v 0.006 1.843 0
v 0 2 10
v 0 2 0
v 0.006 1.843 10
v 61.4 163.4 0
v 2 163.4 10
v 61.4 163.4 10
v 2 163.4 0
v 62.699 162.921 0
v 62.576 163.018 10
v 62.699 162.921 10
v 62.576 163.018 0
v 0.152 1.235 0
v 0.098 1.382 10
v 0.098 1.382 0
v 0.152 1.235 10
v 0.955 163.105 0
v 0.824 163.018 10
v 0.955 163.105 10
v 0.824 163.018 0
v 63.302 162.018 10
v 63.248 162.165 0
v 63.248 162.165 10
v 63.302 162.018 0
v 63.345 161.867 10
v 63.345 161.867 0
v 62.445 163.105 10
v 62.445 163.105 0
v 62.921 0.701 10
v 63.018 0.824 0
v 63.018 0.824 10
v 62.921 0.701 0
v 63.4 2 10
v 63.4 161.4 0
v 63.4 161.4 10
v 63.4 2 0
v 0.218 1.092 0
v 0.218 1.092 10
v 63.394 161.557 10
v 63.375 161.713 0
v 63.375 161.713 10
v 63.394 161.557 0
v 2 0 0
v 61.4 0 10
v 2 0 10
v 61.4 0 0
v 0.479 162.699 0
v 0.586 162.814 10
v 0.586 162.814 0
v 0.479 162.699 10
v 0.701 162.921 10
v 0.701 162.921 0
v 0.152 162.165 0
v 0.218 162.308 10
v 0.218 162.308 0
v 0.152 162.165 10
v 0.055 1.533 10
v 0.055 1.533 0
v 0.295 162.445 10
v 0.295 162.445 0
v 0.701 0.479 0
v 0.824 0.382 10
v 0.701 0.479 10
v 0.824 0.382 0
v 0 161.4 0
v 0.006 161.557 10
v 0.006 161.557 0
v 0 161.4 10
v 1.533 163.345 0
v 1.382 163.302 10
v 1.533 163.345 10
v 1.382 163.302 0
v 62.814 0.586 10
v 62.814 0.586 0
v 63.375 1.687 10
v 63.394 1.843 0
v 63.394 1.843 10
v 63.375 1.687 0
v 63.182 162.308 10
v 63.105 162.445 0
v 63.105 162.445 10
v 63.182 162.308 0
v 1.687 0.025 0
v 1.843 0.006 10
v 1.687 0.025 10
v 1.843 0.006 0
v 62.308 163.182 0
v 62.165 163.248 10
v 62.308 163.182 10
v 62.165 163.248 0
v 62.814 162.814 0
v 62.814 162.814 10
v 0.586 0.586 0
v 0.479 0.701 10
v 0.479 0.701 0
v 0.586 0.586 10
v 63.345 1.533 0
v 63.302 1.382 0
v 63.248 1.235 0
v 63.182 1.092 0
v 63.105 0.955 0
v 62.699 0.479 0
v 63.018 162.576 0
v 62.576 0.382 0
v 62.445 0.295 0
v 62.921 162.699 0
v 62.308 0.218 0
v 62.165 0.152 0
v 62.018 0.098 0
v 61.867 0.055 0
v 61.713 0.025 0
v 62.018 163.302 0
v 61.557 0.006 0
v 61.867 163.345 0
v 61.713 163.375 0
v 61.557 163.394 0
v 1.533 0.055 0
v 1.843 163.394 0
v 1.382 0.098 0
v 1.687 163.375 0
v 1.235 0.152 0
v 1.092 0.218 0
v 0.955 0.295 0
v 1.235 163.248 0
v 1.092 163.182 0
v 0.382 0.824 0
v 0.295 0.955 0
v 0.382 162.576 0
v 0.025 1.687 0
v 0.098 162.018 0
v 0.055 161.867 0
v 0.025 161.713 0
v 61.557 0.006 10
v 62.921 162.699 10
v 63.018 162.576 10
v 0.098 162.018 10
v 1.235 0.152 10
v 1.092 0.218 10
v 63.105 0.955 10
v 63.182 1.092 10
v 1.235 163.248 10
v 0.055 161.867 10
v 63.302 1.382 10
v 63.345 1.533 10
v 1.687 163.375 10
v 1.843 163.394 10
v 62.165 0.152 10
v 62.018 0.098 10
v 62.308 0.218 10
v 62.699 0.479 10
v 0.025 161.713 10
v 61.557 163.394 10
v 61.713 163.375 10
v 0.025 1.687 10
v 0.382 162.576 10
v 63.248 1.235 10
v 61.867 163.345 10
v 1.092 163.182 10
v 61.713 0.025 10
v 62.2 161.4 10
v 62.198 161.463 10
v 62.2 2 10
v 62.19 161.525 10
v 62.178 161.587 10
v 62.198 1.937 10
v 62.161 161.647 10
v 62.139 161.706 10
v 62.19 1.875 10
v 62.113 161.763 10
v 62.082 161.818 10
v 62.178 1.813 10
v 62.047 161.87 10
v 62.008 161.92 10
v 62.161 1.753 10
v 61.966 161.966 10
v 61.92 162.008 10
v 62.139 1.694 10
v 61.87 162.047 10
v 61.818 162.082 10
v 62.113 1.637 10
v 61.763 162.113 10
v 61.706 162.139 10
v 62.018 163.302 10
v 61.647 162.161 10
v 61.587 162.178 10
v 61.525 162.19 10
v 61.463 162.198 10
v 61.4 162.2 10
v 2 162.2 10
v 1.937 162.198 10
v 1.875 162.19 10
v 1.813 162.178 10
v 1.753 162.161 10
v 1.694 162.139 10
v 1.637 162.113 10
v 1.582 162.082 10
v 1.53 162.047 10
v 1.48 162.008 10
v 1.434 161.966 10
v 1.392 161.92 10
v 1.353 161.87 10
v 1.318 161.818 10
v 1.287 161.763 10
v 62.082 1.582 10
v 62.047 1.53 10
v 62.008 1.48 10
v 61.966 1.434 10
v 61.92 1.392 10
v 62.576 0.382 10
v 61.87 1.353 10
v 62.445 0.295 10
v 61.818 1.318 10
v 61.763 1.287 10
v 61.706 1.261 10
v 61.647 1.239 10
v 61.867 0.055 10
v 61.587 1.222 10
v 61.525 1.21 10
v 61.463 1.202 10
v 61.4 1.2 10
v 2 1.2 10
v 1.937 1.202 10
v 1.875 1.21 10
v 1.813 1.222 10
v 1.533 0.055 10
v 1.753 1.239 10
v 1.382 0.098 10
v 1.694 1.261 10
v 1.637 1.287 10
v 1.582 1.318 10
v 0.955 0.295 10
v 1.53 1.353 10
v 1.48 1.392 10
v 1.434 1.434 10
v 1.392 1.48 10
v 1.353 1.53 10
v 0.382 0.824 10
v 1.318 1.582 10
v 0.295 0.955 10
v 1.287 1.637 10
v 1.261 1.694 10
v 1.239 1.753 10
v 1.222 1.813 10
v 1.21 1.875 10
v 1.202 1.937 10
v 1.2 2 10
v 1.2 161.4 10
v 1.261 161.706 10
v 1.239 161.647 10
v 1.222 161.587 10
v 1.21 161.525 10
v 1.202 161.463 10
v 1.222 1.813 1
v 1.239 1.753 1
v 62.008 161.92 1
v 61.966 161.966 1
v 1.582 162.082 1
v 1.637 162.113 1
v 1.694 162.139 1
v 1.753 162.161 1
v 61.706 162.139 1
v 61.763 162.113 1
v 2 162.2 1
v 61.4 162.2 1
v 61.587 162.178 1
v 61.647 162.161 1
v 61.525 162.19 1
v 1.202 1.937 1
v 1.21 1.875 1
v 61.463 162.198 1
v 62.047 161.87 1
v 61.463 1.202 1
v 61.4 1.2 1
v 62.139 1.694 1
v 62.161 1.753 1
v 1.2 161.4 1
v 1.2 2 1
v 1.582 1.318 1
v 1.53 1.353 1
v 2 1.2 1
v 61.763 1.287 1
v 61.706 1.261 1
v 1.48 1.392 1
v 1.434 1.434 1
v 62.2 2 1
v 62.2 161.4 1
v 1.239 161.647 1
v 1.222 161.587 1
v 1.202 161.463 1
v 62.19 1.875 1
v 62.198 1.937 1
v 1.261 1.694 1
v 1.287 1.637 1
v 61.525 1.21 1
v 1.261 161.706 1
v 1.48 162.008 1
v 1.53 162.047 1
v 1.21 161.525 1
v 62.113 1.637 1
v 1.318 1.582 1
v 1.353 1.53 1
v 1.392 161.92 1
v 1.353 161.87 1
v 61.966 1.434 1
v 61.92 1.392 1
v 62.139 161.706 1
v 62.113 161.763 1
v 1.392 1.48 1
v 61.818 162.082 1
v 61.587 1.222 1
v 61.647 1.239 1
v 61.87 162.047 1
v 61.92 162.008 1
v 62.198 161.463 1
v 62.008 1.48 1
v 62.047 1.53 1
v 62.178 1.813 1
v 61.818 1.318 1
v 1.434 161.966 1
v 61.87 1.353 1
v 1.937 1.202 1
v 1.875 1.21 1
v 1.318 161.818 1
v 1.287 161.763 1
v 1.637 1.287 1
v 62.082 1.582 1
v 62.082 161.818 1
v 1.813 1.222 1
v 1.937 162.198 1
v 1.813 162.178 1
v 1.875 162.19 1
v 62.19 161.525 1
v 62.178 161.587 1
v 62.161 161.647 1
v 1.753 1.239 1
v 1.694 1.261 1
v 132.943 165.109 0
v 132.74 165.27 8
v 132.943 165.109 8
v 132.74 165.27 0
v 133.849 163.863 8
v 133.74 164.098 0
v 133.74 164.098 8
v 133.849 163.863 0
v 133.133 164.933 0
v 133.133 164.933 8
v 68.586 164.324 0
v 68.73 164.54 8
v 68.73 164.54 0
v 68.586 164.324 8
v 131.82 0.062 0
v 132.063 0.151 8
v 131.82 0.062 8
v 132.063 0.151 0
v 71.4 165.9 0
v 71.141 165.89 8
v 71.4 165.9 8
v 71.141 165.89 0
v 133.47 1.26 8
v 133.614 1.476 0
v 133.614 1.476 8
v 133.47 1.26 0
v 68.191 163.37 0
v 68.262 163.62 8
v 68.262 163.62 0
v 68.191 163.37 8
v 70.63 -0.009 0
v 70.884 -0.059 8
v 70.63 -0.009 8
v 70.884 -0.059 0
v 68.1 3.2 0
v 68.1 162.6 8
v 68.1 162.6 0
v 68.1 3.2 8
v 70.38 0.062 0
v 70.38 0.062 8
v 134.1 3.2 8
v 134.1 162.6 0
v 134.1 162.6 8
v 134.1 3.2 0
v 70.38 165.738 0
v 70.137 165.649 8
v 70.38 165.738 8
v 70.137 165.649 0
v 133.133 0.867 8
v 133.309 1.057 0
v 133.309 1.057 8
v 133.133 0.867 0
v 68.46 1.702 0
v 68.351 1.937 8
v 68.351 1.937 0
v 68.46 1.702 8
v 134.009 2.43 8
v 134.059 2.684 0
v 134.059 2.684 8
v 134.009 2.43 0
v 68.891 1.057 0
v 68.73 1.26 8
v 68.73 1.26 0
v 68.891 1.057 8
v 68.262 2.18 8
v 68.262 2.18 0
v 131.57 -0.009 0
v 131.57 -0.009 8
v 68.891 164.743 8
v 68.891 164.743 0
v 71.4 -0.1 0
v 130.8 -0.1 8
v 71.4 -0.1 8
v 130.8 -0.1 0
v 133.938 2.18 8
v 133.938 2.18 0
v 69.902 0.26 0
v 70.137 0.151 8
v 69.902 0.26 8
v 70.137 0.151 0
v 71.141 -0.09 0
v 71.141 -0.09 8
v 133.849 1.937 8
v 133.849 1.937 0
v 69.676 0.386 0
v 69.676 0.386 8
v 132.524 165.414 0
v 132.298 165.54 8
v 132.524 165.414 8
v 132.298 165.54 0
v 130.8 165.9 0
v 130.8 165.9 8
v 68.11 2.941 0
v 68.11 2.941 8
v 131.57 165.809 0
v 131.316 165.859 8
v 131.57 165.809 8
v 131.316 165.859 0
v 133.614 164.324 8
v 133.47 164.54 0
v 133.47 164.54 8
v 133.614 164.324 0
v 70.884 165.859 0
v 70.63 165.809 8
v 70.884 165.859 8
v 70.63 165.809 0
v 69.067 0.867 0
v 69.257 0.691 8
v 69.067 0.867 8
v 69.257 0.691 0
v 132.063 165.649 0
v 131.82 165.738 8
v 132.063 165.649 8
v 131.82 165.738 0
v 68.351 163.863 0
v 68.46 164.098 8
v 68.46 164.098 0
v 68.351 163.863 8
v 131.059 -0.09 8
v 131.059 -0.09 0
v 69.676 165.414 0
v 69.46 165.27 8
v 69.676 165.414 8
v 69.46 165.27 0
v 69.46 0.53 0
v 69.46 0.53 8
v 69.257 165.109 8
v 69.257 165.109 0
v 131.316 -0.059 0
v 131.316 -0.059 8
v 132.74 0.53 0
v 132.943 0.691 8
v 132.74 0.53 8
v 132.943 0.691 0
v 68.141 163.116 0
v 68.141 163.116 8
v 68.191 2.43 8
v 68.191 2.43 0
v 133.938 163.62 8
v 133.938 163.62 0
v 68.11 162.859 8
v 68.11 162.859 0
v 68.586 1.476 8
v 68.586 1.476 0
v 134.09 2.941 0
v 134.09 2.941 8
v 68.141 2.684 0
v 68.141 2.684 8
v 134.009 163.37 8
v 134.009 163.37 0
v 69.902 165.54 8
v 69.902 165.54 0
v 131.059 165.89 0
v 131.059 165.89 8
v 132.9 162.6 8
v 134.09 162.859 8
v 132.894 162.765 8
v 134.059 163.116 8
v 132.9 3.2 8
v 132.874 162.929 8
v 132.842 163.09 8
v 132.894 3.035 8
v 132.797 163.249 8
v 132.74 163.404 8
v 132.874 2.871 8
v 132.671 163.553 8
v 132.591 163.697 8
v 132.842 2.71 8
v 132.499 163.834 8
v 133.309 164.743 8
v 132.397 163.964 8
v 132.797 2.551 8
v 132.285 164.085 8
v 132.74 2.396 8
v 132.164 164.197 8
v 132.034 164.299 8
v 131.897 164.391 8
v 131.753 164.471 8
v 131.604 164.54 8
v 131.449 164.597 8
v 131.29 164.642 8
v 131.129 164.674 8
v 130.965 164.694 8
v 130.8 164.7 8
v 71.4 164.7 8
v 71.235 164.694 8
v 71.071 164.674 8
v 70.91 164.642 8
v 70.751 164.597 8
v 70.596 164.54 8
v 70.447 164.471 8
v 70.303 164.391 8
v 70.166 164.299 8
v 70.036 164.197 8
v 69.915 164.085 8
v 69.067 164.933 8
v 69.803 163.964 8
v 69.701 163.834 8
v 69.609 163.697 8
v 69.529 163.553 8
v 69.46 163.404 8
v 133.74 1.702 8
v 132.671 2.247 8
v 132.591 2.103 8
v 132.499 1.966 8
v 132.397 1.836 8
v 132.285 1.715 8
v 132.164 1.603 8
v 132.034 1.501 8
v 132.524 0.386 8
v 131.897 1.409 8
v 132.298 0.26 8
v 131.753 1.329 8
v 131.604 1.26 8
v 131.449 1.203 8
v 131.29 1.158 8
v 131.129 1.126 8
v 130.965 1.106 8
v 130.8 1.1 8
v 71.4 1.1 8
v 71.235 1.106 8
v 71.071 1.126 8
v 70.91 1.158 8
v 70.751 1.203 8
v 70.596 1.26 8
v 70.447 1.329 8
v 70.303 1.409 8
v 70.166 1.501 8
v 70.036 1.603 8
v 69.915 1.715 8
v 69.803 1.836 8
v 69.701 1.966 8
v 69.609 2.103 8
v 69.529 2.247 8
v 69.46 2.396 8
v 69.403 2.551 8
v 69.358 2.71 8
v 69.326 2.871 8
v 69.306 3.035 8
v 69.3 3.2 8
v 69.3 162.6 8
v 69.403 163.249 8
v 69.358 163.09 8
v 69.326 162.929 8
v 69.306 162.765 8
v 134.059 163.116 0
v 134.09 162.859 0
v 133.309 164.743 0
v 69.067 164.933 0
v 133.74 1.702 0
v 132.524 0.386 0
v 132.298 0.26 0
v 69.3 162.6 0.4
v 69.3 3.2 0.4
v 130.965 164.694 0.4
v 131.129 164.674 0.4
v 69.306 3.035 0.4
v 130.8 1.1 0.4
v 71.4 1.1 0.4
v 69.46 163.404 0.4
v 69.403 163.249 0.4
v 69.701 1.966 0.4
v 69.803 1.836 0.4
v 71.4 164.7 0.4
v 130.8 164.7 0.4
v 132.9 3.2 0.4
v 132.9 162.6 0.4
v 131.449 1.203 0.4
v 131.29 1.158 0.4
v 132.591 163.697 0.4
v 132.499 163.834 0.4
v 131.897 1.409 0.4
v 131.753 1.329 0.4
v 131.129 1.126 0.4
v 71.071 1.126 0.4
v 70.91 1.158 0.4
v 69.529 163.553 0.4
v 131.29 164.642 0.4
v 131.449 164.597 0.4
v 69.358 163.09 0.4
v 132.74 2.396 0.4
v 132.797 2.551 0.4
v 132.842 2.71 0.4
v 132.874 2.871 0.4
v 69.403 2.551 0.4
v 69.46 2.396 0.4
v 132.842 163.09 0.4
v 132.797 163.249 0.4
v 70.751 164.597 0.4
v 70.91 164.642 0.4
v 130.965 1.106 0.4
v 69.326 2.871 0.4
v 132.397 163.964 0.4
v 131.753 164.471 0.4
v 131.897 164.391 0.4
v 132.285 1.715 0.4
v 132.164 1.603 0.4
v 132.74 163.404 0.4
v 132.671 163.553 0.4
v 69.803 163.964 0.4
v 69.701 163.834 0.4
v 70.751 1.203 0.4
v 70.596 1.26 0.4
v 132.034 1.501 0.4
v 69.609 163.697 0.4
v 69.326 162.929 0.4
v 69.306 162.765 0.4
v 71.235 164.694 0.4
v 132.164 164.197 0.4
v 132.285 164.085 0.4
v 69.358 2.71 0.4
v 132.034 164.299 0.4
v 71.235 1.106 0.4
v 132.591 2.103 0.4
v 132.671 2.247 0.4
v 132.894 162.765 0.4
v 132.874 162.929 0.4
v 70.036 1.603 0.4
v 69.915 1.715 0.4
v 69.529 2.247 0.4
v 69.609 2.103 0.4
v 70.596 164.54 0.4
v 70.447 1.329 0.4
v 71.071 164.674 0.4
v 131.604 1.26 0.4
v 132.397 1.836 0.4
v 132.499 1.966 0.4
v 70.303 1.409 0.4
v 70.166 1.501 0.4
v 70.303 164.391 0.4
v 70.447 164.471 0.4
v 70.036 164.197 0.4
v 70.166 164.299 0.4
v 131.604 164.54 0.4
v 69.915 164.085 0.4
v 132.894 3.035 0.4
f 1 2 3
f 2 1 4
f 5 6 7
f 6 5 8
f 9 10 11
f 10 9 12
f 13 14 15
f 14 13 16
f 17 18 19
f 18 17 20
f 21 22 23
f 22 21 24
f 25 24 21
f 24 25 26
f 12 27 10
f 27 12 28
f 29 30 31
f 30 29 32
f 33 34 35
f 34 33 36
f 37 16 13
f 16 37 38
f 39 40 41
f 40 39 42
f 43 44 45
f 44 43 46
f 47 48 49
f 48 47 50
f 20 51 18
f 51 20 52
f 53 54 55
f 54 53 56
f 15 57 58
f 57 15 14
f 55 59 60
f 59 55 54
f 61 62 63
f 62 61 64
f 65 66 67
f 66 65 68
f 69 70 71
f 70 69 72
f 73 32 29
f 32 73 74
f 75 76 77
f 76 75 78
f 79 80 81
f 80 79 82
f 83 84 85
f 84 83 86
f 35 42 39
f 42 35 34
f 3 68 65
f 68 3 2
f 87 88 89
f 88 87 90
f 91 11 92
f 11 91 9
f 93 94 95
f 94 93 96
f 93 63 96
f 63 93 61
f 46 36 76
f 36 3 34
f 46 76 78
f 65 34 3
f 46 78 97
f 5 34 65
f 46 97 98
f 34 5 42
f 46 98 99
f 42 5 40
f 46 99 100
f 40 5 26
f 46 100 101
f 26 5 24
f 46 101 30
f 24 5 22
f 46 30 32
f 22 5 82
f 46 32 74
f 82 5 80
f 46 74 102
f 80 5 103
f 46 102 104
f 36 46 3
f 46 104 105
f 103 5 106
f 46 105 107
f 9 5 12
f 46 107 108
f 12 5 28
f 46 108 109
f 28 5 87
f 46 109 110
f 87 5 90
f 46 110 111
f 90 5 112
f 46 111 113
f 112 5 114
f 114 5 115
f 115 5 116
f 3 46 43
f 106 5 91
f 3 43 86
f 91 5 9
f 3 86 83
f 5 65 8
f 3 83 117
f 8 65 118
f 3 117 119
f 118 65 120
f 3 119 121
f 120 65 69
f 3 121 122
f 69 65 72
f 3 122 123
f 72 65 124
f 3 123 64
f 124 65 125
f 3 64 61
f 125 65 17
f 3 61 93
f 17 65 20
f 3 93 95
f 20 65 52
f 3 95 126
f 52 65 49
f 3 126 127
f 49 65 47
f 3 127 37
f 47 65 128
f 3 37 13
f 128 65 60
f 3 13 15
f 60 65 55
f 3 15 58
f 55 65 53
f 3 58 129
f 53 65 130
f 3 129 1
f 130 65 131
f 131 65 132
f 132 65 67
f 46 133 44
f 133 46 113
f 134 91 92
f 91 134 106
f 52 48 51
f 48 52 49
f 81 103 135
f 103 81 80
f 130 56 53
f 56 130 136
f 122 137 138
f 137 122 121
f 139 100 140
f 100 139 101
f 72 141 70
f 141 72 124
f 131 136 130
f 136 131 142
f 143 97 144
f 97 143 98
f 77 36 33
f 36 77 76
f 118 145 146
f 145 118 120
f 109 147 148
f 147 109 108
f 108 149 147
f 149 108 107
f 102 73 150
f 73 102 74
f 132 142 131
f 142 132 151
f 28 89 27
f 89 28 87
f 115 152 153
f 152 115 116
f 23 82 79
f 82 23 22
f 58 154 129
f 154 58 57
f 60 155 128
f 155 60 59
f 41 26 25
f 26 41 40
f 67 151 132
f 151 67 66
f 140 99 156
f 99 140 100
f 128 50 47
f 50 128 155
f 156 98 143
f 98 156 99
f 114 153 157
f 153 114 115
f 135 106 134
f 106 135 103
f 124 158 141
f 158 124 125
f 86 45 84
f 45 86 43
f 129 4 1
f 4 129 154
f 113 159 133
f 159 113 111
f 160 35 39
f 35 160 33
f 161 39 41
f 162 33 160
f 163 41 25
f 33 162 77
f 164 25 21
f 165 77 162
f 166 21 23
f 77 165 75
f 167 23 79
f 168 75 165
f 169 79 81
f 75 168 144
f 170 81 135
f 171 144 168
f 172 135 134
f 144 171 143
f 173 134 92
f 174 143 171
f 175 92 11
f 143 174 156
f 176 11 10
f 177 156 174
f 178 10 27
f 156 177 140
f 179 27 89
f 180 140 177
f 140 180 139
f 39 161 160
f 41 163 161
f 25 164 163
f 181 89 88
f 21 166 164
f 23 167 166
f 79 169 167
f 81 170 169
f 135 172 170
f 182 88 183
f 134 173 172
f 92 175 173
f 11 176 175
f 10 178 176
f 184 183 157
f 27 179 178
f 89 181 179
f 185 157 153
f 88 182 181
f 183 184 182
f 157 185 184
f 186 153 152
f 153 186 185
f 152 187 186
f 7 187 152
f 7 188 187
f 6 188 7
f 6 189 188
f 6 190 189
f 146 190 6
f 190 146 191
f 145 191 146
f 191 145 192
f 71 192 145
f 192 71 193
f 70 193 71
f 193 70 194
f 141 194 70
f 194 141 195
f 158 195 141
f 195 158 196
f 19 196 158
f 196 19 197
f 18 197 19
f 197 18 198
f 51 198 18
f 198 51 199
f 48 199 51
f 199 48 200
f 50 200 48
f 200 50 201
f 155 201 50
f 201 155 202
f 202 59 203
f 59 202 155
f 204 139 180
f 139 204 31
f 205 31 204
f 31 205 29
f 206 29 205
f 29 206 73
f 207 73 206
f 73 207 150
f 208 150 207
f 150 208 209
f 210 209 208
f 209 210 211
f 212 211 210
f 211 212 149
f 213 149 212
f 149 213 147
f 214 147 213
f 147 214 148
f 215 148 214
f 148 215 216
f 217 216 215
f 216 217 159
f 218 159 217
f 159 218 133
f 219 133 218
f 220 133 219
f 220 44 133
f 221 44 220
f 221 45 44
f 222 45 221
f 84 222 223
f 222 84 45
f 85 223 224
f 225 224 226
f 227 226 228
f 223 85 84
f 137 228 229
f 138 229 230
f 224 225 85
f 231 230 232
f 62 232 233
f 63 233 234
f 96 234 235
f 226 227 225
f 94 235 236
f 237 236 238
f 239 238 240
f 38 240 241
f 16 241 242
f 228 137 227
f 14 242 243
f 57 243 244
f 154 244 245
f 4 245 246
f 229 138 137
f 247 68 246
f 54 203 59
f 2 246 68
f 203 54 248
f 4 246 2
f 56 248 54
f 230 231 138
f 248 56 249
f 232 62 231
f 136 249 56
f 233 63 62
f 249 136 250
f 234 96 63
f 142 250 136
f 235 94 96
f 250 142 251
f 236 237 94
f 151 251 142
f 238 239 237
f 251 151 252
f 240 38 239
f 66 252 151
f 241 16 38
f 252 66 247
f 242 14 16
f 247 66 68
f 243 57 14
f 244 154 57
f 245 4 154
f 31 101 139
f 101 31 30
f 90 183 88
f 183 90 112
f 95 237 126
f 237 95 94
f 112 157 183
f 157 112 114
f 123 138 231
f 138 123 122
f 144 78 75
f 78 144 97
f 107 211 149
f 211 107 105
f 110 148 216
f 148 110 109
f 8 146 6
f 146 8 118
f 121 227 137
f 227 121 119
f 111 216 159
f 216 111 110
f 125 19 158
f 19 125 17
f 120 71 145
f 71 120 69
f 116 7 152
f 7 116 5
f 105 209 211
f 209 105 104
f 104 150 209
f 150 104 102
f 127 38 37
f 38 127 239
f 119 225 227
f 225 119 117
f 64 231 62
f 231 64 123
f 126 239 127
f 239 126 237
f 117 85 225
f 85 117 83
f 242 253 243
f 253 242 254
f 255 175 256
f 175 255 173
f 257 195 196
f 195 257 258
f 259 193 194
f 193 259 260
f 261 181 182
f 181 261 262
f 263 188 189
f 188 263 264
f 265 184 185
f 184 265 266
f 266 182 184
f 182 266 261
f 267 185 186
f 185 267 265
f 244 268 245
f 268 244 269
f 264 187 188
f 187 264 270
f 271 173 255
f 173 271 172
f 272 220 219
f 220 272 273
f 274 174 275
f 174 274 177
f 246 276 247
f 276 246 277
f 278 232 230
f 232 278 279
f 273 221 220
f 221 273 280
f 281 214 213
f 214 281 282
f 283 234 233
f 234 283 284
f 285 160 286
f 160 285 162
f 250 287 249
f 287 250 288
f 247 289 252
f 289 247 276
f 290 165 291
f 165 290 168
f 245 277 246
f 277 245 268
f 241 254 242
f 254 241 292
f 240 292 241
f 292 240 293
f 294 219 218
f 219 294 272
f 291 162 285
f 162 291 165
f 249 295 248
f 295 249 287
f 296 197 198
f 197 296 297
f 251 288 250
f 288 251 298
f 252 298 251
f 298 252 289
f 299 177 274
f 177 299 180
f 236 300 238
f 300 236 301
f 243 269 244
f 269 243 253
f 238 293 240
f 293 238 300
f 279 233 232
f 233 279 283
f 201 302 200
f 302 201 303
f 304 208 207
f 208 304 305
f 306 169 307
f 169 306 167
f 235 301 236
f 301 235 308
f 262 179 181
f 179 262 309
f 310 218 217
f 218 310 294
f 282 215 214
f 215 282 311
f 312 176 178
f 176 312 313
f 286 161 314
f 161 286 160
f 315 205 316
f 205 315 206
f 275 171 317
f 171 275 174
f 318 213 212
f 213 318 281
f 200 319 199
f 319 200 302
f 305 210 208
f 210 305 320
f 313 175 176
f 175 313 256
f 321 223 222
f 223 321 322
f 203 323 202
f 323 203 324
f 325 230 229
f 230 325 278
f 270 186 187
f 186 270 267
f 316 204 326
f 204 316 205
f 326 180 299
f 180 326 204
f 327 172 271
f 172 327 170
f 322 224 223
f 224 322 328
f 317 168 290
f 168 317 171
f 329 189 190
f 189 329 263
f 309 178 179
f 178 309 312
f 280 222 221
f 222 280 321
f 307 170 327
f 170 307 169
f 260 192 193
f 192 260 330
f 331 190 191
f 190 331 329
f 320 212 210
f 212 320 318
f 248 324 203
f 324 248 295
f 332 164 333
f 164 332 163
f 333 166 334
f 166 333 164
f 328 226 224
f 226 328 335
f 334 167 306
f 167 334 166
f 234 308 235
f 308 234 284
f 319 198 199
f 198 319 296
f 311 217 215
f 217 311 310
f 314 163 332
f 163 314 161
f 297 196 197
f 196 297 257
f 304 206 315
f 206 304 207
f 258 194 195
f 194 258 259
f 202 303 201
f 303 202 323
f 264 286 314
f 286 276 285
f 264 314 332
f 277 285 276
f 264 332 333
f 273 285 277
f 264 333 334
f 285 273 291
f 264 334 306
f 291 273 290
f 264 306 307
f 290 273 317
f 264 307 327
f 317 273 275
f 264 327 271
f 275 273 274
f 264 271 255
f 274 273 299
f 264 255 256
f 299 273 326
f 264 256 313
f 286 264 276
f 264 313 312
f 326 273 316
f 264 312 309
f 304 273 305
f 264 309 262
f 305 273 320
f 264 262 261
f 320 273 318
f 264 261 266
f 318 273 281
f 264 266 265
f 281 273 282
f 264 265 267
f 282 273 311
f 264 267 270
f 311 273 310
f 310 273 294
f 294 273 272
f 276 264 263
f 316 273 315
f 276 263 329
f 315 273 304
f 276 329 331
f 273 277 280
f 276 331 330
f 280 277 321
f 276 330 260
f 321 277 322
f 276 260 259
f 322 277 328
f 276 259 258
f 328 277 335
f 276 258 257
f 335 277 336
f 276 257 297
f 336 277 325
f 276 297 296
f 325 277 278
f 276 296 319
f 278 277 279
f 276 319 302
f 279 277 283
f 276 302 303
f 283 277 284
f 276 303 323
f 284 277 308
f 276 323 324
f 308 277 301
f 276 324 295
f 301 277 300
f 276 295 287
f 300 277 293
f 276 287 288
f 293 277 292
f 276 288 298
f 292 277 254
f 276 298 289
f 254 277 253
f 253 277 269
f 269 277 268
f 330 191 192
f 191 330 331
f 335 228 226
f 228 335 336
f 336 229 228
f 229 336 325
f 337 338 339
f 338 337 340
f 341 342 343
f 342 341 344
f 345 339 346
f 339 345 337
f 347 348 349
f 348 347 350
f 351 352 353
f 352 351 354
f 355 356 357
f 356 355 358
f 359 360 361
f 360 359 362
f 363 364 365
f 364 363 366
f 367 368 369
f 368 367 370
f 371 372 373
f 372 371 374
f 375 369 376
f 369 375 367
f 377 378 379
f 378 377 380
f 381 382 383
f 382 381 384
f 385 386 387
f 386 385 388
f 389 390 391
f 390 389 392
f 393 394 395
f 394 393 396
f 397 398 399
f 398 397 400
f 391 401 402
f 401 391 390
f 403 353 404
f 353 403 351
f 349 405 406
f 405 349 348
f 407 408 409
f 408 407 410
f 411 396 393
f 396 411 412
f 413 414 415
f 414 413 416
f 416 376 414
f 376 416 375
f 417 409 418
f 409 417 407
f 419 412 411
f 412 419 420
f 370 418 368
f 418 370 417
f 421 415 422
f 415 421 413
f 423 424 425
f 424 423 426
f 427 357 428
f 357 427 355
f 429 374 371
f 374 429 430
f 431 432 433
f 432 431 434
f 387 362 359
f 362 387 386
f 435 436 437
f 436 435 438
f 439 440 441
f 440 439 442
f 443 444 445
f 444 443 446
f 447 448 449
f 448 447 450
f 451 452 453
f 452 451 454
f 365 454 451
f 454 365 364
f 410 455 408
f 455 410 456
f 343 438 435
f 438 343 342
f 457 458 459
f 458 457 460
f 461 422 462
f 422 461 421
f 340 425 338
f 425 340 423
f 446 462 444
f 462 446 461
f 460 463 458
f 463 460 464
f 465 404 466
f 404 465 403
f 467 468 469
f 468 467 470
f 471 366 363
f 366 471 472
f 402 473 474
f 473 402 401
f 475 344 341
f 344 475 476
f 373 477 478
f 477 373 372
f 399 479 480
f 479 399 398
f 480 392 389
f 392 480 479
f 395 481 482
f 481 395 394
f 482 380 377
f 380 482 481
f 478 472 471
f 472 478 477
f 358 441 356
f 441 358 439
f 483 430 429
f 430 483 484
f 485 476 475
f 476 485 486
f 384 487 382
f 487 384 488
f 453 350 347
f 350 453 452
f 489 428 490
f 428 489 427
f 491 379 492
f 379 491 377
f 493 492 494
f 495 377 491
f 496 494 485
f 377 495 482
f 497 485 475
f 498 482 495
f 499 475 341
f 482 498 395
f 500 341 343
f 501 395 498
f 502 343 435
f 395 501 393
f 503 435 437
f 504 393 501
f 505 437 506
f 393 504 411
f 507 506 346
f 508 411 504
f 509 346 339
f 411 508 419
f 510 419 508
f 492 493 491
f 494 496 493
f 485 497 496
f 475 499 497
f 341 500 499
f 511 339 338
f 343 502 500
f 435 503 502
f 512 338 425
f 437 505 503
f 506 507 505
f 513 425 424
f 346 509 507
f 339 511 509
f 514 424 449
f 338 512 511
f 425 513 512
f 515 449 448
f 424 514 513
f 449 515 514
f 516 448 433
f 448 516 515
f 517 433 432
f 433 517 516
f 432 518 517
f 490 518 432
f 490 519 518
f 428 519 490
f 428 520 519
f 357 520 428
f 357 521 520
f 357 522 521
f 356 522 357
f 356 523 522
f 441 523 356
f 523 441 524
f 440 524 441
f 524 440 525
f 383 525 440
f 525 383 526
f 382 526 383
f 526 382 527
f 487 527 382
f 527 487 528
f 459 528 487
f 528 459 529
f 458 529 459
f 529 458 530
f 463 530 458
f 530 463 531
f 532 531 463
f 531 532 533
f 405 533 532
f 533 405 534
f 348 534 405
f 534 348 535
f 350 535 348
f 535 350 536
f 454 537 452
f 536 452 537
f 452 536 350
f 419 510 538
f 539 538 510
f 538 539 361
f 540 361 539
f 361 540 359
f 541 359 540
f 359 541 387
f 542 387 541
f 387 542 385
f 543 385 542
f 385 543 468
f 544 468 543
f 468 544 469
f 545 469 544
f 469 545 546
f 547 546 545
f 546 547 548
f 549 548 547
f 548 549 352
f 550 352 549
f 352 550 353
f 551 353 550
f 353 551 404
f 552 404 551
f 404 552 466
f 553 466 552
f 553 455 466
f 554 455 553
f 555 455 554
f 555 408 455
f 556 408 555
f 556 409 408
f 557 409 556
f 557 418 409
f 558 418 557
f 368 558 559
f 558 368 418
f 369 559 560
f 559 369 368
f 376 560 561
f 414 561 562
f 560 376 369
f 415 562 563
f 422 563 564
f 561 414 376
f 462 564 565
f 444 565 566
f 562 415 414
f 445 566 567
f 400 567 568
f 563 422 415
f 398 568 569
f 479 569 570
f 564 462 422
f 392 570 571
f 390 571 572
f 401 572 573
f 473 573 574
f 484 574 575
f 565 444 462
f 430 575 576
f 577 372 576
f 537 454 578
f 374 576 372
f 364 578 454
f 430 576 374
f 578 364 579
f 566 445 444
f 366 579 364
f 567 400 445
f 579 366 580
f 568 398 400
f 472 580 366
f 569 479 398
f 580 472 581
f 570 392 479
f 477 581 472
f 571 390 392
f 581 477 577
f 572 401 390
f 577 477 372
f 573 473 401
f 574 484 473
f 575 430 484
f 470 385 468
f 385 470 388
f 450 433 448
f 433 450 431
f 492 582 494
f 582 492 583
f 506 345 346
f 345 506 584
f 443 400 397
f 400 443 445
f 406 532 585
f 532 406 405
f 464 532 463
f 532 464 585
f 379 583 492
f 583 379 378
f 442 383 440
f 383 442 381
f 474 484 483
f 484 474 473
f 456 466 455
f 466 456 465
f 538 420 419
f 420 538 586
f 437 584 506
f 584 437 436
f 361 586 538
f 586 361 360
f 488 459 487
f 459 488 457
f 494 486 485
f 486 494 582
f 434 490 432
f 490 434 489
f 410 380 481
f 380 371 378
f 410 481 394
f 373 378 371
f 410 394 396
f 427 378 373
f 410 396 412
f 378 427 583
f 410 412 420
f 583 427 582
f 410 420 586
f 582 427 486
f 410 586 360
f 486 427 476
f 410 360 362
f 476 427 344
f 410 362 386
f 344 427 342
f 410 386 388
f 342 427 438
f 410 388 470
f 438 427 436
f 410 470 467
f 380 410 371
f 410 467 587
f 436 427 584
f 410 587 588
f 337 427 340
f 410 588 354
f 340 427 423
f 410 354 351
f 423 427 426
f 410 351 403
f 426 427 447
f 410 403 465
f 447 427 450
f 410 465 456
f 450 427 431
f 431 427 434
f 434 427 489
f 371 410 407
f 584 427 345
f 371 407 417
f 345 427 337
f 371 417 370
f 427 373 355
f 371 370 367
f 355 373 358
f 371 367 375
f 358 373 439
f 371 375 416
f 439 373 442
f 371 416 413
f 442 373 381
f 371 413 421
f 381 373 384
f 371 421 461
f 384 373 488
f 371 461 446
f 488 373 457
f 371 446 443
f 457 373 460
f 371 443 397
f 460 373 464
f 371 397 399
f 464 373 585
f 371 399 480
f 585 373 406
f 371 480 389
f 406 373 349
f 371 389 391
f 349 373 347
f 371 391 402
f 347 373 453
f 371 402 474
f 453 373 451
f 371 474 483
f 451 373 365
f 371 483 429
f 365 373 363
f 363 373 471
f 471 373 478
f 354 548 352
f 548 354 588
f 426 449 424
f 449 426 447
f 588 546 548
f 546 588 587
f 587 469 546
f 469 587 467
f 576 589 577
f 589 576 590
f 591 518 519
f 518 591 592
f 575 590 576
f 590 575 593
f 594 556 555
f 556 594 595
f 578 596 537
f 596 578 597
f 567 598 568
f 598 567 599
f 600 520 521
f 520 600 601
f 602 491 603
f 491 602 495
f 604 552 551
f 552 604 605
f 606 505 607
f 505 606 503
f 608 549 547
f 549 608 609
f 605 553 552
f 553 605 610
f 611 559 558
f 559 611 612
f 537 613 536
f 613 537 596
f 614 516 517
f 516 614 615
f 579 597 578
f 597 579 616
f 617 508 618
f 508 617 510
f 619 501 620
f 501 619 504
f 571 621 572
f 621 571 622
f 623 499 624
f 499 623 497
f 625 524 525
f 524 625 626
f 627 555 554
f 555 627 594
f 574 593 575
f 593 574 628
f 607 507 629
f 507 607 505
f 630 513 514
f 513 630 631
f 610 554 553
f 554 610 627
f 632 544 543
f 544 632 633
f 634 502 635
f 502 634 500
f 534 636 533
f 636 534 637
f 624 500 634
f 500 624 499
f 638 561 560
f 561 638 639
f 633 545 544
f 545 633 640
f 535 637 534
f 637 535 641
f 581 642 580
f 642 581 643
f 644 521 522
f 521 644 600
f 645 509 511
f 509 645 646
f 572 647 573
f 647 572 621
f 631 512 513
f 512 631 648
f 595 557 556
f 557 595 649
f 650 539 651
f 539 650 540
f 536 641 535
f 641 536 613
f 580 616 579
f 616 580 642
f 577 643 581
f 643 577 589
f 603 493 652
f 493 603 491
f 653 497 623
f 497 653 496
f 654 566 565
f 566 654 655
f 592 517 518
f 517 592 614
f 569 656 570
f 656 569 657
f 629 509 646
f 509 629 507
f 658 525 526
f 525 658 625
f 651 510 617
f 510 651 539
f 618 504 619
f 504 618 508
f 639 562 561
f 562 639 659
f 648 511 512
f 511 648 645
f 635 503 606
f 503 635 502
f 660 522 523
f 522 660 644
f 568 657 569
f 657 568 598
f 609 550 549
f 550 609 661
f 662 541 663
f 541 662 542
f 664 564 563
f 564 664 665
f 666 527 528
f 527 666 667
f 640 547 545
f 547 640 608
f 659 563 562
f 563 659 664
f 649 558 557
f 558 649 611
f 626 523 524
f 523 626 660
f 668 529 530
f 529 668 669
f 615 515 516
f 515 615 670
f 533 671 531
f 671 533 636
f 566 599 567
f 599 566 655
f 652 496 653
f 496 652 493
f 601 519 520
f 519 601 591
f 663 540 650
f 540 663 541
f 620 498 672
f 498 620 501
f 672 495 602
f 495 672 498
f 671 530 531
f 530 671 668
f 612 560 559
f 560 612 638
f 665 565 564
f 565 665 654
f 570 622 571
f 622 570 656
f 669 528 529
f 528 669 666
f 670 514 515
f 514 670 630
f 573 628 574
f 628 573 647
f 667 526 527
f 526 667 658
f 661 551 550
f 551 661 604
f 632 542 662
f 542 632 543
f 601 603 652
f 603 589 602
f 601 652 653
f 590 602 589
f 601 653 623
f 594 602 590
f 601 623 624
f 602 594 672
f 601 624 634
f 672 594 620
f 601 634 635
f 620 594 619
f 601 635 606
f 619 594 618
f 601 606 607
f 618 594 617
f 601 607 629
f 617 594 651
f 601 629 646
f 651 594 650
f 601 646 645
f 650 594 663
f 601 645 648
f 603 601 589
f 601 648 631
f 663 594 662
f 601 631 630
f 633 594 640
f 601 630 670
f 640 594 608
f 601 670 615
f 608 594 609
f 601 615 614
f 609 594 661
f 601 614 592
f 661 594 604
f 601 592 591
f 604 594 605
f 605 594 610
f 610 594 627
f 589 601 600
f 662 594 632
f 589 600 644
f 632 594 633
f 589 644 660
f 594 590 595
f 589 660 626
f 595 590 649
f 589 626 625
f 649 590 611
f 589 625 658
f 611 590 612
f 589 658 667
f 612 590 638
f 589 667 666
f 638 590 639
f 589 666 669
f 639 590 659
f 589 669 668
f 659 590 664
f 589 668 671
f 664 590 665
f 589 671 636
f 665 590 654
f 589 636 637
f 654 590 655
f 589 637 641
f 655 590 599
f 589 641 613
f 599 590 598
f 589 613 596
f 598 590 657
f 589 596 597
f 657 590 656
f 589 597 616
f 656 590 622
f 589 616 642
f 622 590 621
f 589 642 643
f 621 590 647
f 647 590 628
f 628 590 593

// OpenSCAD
/* [Box] */
//Wall thickness
outwalls=1.2;
//Box height
height=10;
//Box length
length=161 + (outwalls*2);
//Box width
width=61 + (outwalls*2);
//Radius for corners (minimum 2)
cornerrad=2;
//Box thickness for floor
thickness=1.0;

/* [Box Sections] */
//Amount of sections in the length
sectionsl=1;
//Amount of sections in the width
sectionsw=1;
//Sections height
sectionsh=14;
//Inner walls thickness
inwalls=0.8;

/* [Lid] */
//Tolerance for lid
tol=0.1; 
//Lid thickness for top
lidthickness=0.4;
//Lid height
lidheight=8;

l=length-(cornerrad*2);
w=width-(cornerrad*2);

translate([cornerrad, cornerrad, 0]){
    union(){
        difference() {
            hull() {
                h = (height/2);
                translate([0,0,h]) cylinder(h=height, r=cornerrad, $fn=80, center = true);
                translate([0,l,h]) cylinder(h=height, r=cornerrad, $fn=80, center = true);
                translate([w,l,h]) cylinder(h=height, r=cornerrad, $fn=80, center = true);
                translate([w,0,h]) cylinder(h=height, r=cornerrad, $fn=80, center = true);
            }
            hull() {
                h = (height/2) + thickness;
                translate([0,0,h]) cylinder(h=height, r=cornerrad-outwalls, $fn=80, center = true);
                translate([0,l,h]) cylinder(h=height, r=cornerrad-outwalls, $fn=80, center = true);
                translate([w,l,h]) cylinder(h=height, r=cornerrad-outwalls, $fn=80, center = true);
                translate([w,0,h]) cylinder(h=height, r=cornerrad-outwalls, $fn=80, center = true);
            }
        }
        
        if( sectionsl > 0 ){
            cutl = ((length) - (outwalls*2))/sectionsl;
            for(i = [cutl : cutl : length-cutl]) {
                translate([w/2,i+outwalls-cornerrad,sectionsh/2]) cube([width,inwalls,sectionsh], center=true);
            }
        }
        
        if( sectionsw > 0 ){
            cutw = ((width) - (outwalls*2))/sectionsw;
            for(i = [cutw : cutw : width-cutw]) {
                translate([i+outwalls-cornerrad,l/2,sectionsh/2]) cube([inwalls,length,sectionsh], center=true);
            }
        }
        
    }

    translate([w + (cornerrad*2) + 6, outwalls, 0]){
        difference() {
            hull() {
                h = (lidheight/2);
                translate([0,0,h]) cylinder(h=lidheight, r=cornerrad+tol+outwalls, $fn=80, center = true);
                translate([0,l,h]) cylinder(h=lidheight, r=cornerrad+tol+outwalls, $fn=80, center = true);
                translate([w,l,h]) cylinder(h=lidheight, r=cornerrad+tol+outwalls, $fn=80, center = true);
                translate([w,0,h]) cylinder(h=lidheight, r=cornerrad+tol+outwalls, $fn=80, center = true);
            }
            
            hull() {
                h = (lidheight/2) + lidthickness;
                translate([0,0,h]) cylinder(h=lidheight, r=(cornerrad)+tol, $fn=80, center = true);
                translate([0,l,h]) cylinder(h=lidheight, r=(cornerrad)+tol, $fn=80, center = true);
                translate([w,l,h]) cylinder(h=lidheight, r=(cornerrad)+tol, $fn=80, center = true);
                translate([w,0,h]) cylinder(h=lidheight, r=(cornerrad)+tol, $fn=80, center = true);
            }
        }
    }
}
